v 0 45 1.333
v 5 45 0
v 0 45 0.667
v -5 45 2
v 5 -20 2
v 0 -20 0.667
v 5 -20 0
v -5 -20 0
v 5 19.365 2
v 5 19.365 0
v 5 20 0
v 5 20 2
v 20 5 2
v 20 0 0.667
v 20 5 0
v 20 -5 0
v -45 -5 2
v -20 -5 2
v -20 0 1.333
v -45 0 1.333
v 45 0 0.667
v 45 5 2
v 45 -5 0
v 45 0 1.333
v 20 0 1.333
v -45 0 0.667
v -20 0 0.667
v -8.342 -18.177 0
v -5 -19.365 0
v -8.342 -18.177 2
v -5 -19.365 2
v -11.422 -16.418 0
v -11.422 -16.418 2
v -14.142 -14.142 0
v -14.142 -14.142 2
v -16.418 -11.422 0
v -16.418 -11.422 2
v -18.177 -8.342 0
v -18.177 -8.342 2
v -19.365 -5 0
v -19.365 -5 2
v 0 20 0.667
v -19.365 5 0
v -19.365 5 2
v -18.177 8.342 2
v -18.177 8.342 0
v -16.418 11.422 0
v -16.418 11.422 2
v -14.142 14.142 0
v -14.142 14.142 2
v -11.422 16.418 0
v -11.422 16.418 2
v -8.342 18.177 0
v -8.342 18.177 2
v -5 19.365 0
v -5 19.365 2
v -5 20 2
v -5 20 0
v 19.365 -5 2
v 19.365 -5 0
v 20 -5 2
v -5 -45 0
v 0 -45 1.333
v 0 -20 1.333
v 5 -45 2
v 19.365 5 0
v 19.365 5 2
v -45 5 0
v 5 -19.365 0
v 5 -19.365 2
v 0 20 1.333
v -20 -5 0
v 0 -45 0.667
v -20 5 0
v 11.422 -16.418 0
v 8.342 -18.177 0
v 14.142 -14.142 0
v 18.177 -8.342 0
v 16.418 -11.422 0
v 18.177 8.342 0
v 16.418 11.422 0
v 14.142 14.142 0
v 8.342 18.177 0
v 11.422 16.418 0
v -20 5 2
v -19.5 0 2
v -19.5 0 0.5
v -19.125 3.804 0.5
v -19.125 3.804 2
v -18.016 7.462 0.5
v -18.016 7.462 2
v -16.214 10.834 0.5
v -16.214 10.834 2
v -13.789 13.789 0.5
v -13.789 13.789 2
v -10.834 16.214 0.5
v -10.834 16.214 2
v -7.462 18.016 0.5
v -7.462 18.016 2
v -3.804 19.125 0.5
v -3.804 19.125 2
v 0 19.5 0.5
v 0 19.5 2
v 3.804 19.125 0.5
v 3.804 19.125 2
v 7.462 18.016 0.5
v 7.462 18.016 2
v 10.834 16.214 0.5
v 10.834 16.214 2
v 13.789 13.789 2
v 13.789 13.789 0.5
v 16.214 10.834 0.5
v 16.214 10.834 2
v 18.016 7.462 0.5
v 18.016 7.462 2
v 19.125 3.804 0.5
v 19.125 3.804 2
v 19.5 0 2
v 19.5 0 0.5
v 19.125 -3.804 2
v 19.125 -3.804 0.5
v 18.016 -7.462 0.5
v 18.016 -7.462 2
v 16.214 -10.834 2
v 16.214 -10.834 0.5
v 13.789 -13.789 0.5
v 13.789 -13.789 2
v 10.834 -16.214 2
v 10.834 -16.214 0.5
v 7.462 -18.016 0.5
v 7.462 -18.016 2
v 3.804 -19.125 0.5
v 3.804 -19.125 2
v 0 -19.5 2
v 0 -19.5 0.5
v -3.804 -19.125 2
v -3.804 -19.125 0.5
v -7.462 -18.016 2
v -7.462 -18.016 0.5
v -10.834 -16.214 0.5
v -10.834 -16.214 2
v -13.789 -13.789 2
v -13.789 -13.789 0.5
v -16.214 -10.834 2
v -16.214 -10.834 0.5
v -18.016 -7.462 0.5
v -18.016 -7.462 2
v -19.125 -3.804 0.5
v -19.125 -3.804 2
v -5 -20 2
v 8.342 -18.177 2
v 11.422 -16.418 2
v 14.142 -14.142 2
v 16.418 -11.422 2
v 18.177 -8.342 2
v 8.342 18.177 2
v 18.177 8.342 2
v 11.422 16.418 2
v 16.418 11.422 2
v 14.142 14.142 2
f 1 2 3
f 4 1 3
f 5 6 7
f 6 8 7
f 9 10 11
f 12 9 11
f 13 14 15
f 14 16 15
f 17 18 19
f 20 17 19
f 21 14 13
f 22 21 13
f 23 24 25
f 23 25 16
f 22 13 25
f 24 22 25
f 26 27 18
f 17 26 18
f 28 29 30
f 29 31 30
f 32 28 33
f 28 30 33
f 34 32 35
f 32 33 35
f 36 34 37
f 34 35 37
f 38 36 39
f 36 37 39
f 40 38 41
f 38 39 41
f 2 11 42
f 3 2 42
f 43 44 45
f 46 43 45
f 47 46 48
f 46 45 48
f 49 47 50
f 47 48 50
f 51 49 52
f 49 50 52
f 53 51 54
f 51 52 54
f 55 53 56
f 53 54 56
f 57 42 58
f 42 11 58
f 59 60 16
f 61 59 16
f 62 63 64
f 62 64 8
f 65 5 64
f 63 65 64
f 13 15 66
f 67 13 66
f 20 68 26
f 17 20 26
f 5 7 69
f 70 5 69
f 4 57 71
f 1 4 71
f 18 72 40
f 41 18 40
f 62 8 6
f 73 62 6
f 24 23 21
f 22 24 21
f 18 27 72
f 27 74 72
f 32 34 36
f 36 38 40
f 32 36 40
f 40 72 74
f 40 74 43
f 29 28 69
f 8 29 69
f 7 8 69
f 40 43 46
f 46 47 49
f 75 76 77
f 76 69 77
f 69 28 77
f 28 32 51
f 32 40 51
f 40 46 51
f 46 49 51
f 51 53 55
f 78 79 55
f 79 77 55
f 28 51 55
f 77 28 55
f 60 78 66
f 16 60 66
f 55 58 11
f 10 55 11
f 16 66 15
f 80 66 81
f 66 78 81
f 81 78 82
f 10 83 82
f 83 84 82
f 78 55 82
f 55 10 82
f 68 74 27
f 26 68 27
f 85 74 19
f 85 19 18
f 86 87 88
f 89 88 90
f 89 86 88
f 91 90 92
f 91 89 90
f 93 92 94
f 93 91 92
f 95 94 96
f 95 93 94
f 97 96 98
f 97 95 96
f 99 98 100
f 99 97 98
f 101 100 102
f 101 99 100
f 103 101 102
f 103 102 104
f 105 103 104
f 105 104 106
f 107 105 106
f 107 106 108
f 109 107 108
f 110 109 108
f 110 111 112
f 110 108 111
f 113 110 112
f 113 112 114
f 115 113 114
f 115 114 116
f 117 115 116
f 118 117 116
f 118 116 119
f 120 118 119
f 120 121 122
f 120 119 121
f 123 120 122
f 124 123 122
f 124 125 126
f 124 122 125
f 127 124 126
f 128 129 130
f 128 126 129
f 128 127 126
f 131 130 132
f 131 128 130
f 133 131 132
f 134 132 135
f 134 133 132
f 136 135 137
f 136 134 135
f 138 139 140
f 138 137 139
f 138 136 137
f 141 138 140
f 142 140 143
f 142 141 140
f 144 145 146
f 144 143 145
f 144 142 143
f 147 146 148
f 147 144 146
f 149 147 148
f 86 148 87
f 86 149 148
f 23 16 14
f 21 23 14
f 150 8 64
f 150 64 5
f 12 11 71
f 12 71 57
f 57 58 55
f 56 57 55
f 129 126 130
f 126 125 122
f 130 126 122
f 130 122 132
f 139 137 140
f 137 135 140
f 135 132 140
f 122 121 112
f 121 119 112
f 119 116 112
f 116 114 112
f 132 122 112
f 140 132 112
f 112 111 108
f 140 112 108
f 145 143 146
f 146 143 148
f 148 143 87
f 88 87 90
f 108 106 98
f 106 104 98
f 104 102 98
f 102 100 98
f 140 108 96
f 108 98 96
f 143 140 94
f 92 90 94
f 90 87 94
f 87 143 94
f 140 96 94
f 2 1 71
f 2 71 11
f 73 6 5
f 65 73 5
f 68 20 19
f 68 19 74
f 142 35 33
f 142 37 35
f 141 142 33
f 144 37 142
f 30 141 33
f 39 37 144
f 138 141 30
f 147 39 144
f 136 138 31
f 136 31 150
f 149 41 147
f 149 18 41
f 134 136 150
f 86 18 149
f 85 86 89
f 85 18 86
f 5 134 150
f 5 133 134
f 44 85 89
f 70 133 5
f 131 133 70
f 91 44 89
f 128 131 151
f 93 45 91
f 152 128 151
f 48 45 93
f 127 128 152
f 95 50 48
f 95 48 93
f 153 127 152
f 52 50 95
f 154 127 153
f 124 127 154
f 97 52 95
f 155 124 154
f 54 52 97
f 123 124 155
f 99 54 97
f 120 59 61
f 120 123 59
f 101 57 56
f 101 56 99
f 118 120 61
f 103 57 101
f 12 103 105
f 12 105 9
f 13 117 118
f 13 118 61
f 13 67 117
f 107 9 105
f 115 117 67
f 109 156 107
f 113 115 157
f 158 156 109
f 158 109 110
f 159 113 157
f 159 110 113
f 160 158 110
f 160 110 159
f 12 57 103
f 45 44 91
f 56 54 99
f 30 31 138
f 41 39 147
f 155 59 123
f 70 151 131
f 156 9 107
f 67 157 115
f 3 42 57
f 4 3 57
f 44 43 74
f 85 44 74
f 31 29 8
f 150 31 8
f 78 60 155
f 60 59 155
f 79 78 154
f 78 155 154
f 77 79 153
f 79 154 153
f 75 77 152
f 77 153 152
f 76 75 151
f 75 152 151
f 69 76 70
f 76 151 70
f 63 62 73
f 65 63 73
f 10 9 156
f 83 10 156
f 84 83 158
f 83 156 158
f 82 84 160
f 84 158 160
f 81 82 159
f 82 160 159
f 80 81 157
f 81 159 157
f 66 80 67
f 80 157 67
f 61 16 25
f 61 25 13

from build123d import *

# Parameters (mm, degrees)
F0_W      = 20
F0_H      = 2
F2_T      = -0.5
F4_DEPTH  = 2
F6_DEPTH  = 25
F8_DEPTH  = 25
F10_DEPTH = 25
F12_DEPTH = 25


with BuildPart() as f1:
    # F0 (on Front) → F1 (revolve)
    with BuildSketch(Plane.XZ):
        with Locations((-10, 1)):
            Rectangle(F0_W, F0_H)
    revolve(axis=Axis((0, 0, 1), (0, 0, -1)))

    # F2
    f2_openings = [f1.faces().sort_by_distance(p)[0] for p in [
        (0, 0, 2),
    ]]
    offset(amount=F2_T, openings=f2_openings)

    # F3 (on Top) → F4 (join)
    with BuildSketch(Plane.XY):
        with BuildLine():
            Line((5, 20), (0, 20))
            ThreePointArc((0, 20), (2.520086, 19.840594), (5, 19.364917))
            Line((5, 19.364917), (5, 20))
        make_face()
        with BuildLine():
            ThreePointArc((19.364917, 5), (19.840594, 2.520086), (20, 0))
            Line((20, 0), (20, 5))
            Line((20, 5), (19.364917, 5))
        make_face()
        with BuildLine():
            Line((20, -5), (20, 0))
            ThreePointArc((20, 0), (19.840594, -2.520086), (19.364917, -5))
            Line((19.364917, -5), (20, -5))
        make_face()
        with BuildLine():
            ThreePointArc((5, -19.364917), (2.520086, -19.840594), (0, -20))
            Line((0, -20), (5, -20))
            Line((5, -20), (5, -19.364917))
        make_face()
        with BuildLine():
            Line((-5, -20), (0, -20))
            ThreePointArc((0, -20), (-2.520086, -19.840594), (-5, -19.364917))
            Line((-5, -19.364917), (-5, -20))
        make_face()
        with BuildLine():
            ThreePointArc((-19.364917, -5), (-19.840594, -2.520086), (-20, 0))
            Line((-20, 0), (-20, -5))
            Line((-20, -5), (-19.364917, -5))
        make_face()
        with BuildLine():
            Line((-20, 5), (-20, 0))
            ThreePointArc((-20, 0), (-19.840594, 2.520086), (-19.364917, 5))
            Line((-19.364917, 5), (-20, 5))
        make_face()
        with BuildLine():
            Line((0, 20), (-5, 20))
            Line((-5, 20), (-5, 19.364917))
            ThreePointArc((-5, 19.364917), (-2.520086, 19.840594), (0, 20))
        make_face()
    extrude(amount=F4_DEPTH)

    # F5 (on face) → F6 (join)
    with BuildSketch(Plane(origin=(0, 20, 0), x_dir=(-1, 0, 0), z_dir=(0, 1, 0))):
        Polygon((0, 1.333333), (-5, 0), (0, 0.666667), (5, 2), align=None)
    extrude(amount=F6_DEPTH)

    # F7 (on face) → F8 (join)
    with BuildSketch(Plane(origin=(-20, 0, 0), x_dir=(0, -1, 0), z_dir=(-1, 0, 0))):
        Polygon((0, 0.666667), (5, 2), (0, 1.333333), (-5, 0), align=None)
    extrude(amount=F8_DEPTH)

    # F9 (on face) → F10 (join)
    with BuildSketch(Plane.XZ.offset(20)):
        Polygon((0, 1.333333), (-5, 0), (0, 0.666667), align=None)
        Polygon((5, 2), (0, 1.333333), (0, 0.666667), align=None)
    extrude(amount=F10_DEPTH)

    # F11 (on face) → F12 (join)
    with BuildSketch(Plane.YZ.offset(20)):
        Polygon((0, 1.333333), (-5, 0), (0, 0.666667), align=None)
        Polygon((5, 2), (0, 1.333333), (0, 0.666667), align=None)
    extrude(amount=F12_DEPTH)


solid = f1.part
